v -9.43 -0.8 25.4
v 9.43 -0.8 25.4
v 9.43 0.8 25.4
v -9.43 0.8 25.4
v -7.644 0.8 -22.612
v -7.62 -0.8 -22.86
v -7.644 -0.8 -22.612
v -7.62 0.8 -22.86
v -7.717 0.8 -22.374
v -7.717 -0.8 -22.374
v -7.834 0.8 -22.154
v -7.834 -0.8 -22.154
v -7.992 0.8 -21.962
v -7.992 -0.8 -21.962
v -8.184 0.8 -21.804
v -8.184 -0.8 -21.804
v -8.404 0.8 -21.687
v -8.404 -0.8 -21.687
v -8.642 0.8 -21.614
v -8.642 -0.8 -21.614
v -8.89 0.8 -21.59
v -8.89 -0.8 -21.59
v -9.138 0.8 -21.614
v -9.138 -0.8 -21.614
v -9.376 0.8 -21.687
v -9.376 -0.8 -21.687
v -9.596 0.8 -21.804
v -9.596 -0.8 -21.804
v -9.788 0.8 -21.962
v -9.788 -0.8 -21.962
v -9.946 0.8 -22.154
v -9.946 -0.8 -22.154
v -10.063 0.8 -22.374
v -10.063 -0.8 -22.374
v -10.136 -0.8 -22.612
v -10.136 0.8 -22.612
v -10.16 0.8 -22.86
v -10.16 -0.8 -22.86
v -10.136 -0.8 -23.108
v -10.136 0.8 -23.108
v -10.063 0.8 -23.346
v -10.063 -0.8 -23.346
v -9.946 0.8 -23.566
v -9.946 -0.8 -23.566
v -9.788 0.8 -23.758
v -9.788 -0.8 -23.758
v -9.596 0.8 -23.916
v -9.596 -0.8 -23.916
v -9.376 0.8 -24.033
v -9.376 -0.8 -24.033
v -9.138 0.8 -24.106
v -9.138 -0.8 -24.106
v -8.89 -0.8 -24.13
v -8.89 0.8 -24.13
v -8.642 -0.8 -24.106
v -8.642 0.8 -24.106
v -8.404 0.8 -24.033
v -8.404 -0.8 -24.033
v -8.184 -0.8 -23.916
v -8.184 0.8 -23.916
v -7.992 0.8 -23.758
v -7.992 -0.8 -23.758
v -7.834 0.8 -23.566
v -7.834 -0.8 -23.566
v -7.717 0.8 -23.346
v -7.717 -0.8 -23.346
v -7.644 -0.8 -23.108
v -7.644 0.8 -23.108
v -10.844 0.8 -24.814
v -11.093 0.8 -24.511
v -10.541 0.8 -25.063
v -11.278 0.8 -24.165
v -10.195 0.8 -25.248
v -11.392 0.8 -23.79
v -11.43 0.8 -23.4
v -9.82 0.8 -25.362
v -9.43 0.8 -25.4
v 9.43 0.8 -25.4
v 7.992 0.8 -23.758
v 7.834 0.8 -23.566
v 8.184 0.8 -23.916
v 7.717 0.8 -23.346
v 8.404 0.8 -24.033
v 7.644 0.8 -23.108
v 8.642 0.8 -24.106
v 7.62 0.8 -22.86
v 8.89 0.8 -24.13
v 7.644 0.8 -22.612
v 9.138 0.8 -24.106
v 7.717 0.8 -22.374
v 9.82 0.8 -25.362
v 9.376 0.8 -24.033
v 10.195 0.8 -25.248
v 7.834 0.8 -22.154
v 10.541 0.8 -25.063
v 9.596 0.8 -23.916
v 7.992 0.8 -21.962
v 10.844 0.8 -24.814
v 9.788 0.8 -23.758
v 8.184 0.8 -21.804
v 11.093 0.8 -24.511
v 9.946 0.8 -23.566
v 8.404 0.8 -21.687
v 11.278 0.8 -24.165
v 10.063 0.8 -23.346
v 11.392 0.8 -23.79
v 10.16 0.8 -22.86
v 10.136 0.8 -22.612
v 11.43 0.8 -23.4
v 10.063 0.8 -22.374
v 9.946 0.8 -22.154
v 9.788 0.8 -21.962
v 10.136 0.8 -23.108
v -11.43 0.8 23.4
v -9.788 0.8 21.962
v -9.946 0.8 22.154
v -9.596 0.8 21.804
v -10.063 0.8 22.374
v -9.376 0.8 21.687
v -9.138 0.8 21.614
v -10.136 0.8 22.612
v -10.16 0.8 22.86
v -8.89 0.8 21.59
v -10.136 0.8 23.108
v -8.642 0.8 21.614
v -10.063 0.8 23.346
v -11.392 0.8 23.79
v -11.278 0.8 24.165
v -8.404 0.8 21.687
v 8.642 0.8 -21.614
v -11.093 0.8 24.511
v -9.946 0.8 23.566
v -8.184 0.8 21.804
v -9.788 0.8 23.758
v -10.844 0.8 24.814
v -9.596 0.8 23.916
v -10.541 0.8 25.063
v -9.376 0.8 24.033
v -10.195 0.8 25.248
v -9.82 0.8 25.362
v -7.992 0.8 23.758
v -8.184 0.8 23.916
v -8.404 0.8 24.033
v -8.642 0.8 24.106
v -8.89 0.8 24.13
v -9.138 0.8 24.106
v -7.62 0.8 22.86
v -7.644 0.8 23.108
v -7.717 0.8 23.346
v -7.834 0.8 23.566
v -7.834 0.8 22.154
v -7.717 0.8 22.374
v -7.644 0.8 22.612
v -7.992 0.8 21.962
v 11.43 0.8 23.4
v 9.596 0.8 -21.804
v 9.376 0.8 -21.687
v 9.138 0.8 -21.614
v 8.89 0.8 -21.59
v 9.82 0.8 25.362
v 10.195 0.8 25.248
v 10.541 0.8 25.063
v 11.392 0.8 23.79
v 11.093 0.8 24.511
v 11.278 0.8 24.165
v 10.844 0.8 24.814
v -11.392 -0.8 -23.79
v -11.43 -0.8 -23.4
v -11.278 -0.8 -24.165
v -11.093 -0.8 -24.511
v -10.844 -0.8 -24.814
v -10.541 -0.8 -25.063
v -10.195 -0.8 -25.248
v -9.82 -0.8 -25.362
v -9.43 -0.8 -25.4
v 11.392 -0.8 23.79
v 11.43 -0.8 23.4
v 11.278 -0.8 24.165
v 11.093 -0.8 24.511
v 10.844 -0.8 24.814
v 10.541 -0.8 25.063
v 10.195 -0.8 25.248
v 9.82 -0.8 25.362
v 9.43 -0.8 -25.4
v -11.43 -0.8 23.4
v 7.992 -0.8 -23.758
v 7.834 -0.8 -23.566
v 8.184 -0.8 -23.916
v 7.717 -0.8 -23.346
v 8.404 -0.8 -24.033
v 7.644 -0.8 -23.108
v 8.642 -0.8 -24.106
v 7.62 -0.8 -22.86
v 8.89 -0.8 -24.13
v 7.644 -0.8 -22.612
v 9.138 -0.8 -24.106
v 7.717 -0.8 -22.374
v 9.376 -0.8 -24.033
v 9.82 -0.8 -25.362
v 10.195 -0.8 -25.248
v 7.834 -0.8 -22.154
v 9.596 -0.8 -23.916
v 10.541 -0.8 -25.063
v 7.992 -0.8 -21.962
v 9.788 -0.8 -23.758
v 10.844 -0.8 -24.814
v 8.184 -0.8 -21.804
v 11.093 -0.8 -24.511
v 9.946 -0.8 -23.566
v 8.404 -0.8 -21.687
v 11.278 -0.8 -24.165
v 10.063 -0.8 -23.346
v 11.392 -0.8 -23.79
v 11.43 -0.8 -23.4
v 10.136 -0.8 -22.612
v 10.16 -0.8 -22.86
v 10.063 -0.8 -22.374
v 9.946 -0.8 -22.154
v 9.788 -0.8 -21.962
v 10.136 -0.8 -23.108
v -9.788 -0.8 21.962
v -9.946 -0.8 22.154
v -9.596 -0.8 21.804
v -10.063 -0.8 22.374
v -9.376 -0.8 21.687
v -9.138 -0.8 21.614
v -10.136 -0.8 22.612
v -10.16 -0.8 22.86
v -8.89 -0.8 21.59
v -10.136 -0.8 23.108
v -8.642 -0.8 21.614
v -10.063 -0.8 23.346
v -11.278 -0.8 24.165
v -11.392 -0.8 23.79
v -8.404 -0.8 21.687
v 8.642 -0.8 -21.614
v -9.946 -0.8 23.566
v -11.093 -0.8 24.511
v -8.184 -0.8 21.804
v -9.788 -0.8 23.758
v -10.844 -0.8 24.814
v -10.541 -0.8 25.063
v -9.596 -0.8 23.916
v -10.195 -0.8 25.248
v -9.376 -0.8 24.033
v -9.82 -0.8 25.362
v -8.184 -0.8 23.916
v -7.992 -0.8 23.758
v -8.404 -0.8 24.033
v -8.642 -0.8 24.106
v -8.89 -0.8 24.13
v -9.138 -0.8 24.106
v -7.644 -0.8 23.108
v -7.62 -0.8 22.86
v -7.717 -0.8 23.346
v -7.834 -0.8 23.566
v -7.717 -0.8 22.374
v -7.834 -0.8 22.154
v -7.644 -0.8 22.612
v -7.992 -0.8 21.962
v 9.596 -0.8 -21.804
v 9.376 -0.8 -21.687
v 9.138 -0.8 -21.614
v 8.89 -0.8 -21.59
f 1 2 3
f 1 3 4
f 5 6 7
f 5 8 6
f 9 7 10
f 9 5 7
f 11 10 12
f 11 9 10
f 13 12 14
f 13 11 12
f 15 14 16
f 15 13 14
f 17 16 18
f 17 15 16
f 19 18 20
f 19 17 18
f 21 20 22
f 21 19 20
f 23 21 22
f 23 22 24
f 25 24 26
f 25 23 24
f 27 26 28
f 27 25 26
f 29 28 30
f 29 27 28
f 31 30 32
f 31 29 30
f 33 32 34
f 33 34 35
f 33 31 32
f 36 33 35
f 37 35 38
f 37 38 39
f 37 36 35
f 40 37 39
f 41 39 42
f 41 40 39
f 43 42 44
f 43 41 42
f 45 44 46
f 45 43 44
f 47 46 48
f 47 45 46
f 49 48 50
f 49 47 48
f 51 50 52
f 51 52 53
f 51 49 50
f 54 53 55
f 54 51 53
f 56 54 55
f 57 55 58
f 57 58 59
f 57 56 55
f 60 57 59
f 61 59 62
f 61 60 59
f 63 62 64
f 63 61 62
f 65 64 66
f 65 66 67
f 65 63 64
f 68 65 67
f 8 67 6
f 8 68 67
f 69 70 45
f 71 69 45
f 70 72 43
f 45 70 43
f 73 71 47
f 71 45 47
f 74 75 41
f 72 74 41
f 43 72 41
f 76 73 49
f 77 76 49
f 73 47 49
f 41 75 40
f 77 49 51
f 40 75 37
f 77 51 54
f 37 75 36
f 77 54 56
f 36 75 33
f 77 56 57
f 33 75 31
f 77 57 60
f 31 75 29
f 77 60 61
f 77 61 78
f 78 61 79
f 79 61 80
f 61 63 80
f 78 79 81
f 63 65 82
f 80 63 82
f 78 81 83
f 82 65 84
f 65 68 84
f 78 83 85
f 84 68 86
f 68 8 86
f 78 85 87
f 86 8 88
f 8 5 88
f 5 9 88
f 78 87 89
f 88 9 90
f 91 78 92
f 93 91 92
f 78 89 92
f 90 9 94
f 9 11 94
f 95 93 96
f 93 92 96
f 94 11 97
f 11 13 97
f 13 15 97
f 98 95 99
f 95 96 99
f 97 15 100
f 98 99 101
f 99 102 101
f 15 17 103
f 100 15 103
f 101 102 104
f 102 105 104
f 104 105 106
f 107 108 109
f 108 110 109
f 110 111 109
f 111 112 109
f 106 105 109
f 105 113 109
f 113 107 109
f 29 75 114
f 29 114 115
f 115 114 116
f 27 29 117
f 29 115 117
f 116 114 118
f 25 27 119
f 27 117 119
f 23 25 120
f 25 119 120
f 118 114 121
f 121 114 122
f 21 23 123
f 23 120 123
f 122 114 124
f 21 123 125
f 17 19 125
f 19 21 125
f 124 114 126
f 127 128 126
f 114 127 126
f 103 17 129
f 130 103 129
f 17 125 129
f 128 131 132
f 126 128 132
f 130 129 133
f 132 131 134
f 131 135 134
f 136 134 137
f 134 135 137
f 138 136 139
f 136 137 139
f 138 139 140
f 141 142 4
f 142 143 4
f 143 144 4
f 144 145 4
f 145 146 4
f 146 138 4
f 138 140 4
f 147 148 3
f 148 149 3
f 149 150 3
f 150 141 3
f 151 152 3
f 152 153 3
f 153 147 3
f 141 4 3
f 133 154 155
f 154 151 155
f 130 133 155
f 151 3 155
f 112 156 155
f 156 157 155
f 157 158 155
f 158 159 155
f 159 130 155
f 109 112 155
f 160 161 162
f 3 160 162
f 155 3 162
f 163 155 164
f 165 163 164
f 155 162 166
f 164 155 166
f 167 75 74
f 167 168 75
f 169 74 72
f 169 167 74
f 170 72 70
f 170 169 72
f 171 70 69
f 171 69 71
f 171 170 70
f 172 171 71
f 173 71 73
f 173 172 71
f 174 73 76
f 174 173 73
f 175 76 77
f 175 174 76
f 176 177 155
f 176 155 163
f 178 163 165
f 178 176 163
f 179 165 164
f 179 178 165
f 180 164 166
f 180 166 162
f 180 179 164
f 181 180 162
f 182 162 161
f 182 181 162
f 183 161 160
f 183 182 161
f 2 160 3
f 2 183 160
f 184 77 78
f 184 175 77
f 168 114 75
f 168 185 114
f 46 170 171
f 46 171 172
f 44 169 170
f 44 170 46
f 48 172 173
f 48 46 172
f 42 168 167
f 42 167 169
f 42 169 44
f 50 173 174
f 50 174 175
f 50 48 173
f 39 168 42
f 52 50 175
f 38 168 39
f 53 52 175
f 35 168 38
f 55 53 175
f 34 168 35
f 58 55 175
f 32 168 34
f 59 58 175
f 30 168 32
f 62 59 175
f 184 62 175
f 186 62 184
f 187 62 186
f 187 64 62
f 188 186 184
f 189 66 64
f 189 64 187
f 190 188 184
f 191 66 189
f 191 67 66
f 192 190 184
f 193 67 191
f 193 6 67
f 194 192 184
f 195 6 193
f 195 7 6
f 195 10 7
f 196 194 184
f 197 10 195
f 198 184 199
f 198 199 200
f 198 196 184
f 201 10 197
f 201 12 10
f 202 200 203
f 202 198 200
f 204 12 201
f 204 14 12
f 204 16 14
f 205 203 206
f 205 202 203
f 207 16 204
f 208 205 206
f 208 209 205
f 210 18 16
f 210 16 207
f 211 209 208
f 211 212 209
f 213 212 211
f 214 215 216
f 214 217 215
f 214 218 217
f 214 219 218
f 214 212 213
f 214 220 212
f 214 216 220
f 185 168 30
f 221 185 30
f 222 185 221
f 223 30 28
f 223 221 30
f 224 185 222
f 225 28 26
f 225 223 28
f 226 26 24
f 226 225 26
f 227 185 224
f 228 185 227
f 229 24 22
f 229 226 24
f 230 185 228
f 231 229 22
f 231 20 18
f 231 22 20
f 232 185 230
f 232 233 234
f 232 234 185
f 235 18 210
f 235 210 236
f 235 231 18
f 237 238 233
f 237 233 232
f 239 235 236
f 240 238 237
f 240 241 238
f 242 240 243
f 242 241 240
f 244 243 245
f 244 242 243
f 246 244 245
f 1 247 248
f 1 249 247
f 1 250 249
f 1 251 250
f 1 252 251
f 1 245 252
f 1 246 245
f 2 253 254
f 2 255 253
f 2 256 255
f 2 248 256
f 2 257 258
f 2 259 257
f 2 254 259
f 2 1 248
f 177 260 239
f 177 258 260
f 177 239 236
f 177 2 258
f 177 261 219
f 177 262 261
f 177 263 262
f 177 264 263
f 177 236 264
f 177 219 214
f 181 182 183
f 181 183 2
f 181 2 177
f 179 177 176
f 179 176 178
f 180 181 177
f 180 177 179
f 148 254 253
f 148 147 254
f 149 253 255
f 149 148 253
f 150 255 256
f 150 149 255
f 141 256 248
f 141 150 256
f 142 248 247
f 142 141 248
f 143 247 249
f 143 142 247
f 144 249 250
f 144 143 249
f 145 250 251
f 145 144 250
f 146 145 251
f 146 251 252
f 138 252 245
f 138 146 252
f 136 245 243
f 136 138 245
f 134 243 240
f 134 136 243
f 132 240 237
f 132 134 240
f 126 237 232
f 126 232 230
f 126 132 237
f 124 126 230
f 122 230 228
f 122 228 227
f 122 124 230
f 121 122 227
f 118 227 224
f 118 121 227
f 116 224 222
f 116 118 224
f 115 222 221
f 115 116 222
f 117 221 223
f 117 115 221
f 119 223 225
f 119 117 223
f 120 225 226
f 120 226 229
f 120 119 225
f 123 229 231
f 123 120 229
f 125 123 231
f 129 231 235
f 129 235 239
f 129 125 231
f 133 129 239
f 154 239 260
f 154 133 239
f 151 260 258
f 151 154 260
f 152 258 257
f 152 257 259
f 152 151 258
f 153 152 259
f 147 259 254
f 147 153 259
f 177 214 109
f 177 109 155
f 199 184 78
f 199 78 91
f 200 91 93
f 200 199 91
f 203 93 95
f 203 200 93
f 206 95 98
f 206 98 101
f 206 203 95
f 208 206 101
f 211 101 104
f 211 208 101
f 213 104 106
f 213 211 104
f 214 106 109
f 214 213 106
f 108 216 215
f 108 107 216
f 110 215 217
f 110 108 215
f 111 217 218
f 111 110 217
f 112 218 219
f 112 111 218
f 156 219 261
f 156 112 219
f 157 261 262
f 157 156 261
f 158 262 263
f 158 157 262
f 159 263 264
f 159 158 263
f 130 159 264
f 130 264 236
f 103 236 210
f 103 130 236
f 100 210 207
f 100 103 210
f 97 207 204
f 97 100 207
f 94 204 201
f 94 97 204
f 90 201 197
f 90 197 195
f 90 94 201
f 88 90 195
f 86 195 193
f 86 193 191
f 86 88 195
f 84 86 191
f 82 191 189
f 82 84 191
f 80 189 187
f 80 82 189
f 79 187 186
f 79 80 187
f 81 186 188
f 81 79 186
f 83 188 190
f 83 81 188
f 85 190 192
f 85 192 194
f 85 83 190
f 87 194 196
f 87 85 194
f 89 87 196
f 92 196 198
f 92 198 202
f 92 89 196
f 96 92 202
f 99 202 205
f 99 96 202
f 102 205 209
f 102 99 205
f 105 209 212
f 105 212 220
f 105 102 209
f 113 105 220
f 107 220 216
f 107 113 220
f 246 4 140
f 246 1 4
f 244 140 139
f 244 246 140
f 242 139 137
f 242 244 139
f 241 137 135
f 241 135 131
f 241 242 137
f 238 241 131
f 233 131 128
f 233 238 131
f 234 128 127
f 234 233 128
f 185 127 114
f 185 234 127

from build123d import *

# Parameters (mm, degrees)
F0_R     = 1.27
F1_DEPTH = 0.8


with BuildPart() as f1:
    # F0 (on Front) → F1 (new body, symmetric)
    with BuildSketch(Plane.XZ):
        with BuildLine():
            Line((-9.43, -25.4), (9.43, -25.4))
            ThreePointArc((9.43, -25.4), (10.844214, -24.814214), (11.43, -23.4))
            Line((11.43, -23.4), (11.43, 23.4))
            ThreePointArc((11.43, 23.4), (10.844214, 24.814214), (9.43, 25.4))
            Line((9.43, 25.4), (-9.43, 25.4))
            ThreePointArc((-9.43, 25.4), (-10.844214, 24.814214), (-11.43, 23.4))
            Line((-11.43, 23.4), (-11.43, -23.4))
            ThreePointArc((-11.43, -23.4), (-10.844214, -24.814214), (-9.43, -25.4))
        make_face()
        with Locations((-8.89, -22.86)):
            Circle(F0_R, mode=Mode.SUBTRACT)
        with Locations((8.89, -22.86)):
            Circle(F0_R, mode=Mode.SUBTRACT)
        with Locations((-8.89, 22.86)):
            Circle(F0_R, mode=Mode.SUBTRACT)
    extrude(amount=F1_DEPTH, both=True)


solid = f1.part
